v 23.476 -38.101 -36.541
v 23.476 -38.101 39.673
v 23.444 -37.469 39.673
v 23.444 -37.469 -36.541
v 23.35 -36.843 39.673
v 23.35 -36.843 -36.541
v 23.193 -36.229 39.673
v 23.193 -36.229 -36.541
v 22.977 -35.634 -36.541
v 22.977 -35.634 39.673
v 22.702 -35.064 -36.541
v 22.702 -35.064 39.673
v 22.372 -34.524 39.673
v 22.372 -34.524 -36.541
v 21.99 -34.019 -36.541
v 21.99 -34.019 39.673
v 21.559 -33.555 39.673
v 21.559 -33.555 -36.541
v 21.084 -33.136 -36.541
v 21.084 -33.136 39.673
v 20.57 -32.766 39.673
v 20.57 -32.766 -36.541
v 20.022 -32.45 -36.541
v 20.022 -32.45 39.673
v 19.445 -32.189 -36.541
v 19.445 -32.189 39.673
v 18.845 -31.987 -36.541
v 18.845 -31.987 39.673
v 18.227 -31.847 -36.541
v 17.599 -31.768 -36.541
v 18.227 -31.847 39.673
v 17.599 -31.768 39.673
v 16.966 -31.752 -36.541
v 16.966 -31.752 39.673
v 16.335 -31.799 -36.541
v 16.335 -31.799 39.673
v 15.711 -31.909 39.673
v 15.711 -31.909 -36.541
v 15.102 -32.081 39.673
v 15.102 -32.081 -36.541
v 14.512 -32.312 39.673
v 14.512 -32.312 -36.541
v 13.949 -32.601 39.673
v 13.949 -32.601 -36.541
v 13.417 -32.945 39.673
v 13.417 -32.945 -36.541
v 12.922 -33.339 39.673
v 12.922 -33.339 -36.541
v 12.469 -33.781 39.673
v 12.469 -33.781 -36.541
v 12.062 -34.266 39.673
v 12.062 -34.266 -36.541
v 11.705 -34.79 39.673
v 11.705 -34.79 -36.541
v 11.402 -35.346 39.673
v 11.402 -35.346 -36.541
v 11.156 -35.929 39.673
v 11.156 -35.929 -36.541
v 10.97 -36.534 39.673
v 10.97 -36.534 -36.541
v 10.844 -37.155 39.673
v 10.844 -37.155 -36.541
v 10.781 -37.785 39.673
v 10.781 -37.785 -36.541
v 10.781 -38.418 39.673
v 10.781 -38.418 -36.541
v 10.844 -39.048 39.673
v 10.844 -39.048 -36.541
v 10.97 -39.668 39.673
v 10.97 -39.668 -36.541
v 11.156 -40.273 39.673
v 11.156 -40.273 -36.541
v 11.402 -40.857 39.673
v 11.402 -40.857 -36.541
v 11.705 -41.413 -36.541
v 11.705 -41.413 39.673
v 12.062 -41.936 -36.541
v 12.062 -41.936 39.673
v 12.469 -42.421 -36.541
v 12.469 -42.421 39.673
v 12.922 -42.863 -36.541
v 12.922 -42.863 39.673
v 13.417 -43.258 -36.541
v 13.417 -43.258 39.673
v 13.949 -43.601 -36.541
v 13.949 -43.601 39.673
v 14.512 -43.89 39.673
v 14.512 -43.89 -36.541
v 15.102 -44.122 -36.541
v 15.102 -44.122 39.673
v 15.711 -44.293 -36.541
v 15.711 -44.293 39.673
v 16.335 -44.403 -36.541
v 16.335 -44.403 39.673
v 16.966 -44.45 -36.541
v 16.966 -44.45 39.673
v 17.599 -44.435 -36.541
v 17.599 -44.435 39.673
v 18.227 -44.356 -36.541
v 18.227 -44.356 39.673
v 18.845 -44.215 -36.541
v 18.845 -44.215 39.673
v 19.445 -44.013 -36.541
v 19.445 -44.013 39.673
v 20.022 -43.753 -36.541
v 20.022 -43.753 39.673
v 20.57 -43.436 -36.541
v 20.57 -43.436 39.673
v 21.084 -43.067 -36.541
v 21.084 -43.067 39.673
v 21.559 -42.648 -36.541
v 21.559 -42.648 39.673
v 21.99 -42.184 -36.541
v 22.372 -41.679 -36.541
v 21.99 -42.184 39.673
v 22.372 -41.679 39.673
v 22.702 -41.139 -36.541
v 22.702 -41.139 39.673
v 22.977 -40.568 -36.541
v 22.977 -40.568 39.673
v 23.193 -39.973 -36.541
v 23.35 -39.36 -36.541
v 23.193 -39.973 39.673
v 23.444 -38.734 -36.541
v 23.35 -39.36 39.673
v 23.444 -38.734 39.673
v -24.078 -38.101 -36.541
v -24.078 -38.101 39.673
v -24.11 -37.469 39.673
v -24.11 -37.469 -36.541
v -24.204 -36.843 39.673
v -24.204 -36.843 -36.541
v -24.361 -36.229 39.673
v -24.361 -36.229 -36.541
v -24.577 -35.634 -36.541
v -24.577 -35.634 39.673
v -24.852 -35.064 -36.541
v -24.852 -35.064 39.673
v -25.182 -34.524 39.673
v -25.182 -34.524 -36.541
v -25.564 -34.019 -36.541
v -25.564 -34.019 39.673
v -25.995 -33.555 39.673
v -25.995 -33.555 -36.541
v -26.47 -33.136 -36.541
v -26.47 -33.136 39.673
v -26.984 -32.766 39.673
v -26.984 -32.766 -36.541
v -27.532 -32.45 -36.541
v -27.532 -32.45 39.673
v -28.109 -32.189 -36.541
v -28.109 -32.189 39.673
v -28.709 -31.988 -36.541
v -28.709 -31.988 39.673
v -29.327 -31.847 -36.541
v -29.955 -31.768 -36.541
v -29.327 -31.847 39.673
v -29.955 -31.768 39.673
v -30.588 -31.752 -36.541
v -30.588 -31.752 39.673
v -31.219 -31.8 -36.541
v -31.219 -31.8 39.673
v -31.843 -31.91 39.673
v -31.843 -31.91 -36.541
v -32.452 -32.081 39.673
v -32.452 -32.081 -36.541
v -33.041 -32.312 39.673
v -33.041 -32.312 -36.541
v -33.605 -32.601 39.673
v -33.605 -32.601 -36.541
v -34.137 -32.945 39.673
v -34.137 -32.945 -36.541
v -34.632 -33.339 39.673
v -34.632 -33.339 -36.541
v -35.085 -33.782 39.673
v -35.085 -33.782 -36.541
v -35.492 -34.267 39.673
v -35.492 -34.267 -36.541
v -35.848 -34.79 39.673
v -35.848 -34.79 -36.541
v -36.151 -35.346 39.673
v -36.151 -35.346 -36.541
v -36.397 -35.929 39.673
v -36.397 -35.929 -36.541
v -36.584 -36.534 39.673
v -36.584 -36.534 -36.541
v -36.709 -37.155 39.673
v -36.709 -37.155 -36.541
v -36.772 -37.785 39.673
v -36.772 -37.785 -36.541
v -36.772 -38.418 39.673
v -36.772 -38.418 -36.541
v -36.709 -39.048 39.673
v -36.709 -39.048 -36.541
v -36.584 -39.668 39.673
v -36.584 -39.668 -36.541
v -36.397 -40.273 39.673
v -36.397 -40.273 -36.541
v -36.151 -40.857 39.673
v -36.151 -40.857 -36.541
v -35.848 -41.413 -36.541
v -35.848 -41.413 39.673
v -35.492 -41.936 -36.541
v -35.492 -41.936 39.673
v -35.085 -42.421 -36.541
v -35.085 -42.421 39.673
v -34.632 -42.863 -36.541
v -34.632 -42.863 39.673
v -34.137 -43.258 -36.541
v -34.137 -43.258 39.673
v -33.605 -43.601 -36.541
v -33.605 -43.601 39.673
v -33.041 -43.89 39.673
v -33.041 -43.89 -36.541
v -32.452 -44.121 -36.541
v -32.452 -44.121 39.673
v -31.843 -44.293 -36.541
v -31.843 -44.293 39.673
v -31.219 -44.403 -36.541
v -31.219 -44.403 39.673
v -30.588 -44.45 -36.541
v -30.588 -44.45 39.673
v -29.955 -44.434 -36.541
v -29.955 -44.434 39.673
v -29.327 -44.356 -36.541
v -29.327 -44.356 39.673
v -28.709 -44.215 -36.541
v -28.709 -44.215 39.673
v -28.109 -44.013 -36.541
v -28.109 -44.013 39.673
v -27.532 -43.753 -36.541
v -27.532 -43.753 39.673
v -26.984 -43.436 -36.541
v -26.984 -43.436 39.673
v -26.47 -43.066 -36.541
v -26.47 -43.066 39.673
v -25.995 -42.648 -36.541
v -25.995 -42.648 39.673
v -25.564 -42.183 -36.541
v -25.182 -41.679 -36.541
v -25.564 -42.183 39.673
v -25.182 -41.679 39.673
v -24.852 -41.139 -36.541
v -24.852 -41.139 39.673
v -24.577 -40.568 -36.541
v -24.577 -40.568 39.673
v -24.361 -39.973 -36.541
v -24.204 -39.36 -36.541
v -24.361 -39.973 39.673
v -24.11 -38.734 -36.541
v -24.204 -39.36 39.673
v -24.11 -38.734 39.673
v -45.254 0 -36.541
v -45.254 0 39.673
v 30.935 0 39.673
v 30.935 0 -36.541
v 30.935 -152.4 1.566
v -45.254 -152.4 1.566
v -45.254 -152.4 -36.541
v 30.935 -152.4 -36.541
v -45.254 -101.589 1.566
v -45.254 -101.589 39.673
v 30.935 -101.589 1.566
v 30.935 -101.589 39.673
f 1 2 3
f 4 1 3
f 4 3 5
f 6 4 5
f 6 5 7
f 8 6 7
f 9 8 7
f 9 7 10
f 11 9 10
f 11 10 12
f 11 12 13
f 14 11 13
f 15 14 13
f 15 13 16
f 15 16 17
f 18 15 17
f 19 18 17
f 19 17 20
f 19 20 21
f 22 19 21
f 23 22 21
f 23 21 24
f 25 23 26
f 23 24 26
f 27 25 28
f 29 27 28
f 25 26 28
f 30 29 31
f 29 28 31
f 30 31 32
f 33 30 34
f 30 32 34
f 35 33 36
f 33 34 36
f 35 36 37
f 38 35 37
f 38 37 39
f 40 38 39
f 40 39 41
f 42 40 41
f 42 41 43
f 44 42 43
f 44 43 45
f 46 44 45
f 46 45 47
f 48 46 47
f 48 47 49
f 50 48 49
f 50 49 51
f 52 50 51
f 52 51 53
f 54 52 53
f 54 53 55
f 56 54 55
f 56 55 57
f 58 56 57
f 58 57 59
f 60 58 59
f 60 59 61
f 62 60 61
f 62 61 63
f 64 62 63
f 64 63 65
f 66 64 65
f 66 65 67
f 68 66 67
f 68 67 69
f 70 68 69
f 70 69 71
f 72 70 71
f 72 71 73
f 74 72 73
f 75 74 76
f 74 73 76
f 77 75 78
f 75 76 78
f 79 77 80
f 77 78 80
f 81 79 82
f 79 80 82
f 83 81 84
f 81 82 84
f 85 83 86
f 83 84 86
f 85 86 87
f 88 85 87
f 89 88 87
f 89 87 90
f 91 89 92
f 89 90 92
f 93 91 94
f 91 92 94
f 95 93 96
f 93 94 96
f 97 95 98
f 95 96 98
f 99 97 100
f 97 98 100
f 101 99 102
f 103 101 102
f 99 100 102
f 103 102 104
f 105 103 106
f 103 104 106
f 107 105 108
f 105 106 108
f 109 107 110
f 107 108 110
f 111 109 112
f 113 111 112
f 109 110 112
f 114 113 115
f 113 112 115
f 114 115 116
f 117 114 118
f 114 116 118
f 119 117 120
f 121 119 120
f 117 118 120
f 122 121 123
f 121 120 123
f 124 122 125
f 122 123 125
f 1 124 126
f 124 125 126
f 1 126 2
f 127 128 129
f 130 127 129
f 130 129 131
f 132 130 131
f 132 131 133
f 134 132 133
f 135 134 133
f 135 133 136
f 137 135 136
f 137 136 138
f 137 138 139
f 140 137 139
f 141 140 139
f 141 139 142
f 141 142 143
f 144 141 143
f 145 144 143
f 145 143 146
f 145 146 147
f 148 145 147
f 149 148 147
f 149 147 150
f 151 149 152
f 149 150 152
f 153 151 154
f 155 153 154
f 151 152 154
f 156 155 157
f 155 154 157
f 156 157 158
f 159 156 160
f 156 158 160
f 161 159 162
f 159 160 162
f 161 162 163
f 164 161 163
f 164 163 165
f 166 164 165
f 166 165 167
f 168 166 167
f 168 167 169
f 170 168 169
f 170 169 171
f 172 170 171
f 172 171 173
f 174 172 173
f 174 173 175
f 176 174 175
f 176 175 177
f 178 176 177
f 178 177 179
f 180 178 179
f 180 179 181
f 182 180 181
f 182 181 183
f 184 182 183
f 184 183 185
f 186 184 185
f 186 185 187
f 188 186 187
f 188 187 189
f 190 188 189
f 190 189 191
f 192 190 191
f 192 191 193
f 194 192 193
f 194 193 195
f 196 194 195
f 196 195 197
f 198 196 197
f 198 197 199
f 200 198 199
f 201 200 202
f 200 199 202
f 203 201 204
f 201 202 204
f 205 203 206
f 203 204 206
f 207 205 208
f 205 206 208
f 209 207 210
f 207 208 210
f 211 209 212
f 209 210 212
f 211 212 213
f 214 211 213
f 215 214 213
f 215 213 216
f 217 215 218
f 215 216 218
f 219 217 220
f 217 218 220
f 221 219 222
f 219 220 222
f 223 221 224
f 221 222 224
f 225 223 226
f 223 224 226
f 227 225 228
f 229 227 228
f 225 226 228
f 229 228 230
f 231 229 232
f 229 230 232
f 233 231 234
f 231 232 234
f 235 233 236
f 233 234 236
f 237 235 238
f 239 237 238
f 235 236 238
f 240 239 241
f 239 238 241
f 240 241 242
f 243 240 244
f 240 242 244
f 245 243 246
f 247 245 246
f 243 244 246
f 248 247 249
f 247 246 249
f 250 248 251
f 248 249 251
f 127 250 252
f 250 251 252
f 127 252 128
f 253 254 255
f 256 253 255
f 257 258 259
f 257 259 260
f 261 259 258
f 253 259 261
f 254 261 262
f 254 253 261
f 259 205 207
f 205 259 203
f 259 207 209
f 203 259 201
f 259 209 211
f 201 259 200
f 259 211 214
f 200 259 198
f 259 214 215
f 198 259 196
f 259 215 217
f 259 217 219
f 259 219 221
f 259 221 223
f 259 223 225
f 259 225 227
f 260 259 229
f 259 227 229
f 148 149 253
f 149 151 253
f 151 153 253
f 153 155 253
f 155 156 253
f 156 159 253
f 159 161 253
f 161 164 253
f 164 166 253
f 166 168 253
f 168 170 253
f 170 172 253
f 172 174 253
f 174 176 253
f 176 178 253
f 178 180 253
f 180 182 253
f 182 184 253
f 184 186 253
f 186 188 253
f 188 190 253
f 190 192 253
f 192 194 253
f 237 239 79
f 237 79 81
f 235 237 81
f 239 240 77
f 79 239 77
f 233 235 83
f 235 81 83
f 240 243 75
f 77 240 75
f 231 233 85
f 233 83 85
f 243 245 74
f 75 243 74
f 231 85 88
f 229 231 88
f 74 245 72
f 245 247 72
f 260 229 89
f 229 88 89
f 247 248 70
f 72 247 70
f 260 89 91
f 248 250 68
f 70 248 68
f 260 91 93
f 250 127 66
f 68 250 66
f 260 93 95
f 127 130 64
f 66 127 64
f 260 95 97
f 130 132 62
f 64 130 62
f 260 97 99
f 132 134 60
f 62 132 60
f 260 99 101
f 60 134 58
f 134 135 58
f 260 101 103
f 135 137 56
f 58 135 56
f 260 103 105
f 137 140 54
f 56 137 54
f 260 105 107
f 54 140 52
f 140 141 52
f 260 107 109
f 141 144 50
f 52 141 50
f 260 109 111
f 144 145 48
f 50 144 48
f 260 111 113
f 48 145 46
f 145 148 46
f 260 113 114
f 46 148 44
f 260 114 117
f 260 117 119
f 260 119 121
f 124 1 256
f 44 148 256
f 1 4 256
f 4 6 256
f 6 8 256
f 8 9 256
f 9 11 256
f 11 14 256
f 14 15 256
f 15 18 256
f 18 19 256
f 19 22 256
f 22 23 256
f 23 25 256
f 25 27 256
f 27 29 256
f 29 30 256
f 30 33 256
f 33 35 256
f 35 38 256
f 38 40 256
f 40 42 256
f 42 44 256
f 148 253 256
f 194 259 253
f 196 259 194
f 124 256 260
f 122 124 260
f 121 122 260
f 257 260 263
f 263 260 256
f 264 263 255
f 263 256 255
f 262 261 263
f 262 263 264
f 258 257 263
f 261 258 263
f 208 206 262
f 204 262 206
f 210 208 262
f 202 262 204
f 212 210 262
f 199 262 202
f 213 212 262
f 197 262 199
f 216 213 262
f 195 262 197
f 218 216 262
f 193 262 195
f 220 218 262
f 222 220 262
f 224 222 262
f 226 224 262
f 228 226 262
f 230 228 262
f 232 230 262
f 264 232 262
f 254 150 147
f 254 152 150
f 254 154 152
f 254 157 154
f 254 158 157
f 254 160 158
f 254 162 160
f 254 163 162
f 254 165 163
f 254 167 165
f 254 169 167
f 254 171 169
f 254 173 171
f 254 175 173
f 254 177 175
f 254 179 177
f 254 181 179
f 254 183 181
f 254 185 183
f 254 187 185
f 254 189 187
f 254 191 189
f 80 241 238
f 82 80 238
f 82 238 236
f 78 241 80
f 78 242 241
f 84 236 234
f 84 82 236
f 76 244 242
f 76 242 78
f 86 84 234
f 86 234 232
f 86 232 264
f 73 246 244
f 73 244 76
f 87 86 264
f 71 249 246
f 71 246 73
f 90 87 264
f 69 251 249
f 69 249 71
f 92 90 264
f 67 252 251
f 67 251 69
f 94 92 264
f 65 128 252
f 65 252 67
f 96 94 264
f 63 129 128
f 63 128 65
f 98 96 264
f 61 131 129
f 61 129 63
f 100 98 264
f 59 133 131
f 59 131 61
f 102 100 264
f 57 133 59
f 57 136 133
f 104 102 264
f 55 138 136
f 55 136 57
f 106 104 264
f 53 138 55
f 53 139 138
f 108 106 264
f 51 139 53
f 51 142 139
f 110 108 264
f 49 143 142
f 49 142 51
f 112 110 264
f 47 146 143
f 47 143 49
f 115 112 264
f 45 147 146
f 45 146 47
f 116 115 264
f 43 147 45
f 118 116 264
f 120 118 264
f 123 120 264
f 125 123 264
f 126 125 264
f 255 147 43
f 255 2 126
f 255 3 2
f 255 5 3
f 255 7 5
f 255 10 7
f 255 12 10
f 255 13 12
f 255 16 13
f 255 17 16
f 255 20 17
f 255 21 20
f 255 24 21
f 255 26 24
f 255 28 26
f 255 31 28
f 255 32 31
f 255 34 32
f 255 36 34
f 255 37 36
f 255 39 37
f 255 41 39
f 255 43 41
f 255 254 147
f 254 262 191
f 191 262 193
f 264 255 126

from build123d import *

# Parameters (mm, degrees)
F0_W     = 76.189154759
F0_H     = 76.2136504054
F1_DEPTH = 152.4
F2_W     = 50.8111025929
F2_H     = 38.1068252027
F3_DEPTH = 76.2
F4_R     = 6.3508418906
F4_R_2   = 6.3510810939
F5_DEPTH = 101.6


with BuildPart() as f1:
    # F0 (on Front) → F1 (new body)
    with BuildSketch(Plane.XZ):
        with Locations((-7.1593066677, 1.5659481287)):
            Rectangle(F0_W, F0_H)
    extrude(amount=F1_DEPTH)

    # F2 (on face) → F3 (cut)
    with BuildSketch(Plane.YZ.offset(30.9352707118)):
        with Locations((-126.9944487035, 20.6193607301)):
            Rectangle(F2_W, F2_H)
    extrude(amount=-F3_DEPTH, mode=Mode.SUBTRACT)

    # F4 (on face) → F5 (cut)
    with BuildSketch(Plane.XY.offset(39.6727733314)):
        with Locations((-30.4293371737, -38.1011925638)):
            Circle(F4_R)
        with Locations((17.1245448291, -38.1011925638)):
            Circle(F4_R_2)
    extrude(amount=-F5_DEPTH, mode=Mode.SUBTRACT)


solid = f1.part
